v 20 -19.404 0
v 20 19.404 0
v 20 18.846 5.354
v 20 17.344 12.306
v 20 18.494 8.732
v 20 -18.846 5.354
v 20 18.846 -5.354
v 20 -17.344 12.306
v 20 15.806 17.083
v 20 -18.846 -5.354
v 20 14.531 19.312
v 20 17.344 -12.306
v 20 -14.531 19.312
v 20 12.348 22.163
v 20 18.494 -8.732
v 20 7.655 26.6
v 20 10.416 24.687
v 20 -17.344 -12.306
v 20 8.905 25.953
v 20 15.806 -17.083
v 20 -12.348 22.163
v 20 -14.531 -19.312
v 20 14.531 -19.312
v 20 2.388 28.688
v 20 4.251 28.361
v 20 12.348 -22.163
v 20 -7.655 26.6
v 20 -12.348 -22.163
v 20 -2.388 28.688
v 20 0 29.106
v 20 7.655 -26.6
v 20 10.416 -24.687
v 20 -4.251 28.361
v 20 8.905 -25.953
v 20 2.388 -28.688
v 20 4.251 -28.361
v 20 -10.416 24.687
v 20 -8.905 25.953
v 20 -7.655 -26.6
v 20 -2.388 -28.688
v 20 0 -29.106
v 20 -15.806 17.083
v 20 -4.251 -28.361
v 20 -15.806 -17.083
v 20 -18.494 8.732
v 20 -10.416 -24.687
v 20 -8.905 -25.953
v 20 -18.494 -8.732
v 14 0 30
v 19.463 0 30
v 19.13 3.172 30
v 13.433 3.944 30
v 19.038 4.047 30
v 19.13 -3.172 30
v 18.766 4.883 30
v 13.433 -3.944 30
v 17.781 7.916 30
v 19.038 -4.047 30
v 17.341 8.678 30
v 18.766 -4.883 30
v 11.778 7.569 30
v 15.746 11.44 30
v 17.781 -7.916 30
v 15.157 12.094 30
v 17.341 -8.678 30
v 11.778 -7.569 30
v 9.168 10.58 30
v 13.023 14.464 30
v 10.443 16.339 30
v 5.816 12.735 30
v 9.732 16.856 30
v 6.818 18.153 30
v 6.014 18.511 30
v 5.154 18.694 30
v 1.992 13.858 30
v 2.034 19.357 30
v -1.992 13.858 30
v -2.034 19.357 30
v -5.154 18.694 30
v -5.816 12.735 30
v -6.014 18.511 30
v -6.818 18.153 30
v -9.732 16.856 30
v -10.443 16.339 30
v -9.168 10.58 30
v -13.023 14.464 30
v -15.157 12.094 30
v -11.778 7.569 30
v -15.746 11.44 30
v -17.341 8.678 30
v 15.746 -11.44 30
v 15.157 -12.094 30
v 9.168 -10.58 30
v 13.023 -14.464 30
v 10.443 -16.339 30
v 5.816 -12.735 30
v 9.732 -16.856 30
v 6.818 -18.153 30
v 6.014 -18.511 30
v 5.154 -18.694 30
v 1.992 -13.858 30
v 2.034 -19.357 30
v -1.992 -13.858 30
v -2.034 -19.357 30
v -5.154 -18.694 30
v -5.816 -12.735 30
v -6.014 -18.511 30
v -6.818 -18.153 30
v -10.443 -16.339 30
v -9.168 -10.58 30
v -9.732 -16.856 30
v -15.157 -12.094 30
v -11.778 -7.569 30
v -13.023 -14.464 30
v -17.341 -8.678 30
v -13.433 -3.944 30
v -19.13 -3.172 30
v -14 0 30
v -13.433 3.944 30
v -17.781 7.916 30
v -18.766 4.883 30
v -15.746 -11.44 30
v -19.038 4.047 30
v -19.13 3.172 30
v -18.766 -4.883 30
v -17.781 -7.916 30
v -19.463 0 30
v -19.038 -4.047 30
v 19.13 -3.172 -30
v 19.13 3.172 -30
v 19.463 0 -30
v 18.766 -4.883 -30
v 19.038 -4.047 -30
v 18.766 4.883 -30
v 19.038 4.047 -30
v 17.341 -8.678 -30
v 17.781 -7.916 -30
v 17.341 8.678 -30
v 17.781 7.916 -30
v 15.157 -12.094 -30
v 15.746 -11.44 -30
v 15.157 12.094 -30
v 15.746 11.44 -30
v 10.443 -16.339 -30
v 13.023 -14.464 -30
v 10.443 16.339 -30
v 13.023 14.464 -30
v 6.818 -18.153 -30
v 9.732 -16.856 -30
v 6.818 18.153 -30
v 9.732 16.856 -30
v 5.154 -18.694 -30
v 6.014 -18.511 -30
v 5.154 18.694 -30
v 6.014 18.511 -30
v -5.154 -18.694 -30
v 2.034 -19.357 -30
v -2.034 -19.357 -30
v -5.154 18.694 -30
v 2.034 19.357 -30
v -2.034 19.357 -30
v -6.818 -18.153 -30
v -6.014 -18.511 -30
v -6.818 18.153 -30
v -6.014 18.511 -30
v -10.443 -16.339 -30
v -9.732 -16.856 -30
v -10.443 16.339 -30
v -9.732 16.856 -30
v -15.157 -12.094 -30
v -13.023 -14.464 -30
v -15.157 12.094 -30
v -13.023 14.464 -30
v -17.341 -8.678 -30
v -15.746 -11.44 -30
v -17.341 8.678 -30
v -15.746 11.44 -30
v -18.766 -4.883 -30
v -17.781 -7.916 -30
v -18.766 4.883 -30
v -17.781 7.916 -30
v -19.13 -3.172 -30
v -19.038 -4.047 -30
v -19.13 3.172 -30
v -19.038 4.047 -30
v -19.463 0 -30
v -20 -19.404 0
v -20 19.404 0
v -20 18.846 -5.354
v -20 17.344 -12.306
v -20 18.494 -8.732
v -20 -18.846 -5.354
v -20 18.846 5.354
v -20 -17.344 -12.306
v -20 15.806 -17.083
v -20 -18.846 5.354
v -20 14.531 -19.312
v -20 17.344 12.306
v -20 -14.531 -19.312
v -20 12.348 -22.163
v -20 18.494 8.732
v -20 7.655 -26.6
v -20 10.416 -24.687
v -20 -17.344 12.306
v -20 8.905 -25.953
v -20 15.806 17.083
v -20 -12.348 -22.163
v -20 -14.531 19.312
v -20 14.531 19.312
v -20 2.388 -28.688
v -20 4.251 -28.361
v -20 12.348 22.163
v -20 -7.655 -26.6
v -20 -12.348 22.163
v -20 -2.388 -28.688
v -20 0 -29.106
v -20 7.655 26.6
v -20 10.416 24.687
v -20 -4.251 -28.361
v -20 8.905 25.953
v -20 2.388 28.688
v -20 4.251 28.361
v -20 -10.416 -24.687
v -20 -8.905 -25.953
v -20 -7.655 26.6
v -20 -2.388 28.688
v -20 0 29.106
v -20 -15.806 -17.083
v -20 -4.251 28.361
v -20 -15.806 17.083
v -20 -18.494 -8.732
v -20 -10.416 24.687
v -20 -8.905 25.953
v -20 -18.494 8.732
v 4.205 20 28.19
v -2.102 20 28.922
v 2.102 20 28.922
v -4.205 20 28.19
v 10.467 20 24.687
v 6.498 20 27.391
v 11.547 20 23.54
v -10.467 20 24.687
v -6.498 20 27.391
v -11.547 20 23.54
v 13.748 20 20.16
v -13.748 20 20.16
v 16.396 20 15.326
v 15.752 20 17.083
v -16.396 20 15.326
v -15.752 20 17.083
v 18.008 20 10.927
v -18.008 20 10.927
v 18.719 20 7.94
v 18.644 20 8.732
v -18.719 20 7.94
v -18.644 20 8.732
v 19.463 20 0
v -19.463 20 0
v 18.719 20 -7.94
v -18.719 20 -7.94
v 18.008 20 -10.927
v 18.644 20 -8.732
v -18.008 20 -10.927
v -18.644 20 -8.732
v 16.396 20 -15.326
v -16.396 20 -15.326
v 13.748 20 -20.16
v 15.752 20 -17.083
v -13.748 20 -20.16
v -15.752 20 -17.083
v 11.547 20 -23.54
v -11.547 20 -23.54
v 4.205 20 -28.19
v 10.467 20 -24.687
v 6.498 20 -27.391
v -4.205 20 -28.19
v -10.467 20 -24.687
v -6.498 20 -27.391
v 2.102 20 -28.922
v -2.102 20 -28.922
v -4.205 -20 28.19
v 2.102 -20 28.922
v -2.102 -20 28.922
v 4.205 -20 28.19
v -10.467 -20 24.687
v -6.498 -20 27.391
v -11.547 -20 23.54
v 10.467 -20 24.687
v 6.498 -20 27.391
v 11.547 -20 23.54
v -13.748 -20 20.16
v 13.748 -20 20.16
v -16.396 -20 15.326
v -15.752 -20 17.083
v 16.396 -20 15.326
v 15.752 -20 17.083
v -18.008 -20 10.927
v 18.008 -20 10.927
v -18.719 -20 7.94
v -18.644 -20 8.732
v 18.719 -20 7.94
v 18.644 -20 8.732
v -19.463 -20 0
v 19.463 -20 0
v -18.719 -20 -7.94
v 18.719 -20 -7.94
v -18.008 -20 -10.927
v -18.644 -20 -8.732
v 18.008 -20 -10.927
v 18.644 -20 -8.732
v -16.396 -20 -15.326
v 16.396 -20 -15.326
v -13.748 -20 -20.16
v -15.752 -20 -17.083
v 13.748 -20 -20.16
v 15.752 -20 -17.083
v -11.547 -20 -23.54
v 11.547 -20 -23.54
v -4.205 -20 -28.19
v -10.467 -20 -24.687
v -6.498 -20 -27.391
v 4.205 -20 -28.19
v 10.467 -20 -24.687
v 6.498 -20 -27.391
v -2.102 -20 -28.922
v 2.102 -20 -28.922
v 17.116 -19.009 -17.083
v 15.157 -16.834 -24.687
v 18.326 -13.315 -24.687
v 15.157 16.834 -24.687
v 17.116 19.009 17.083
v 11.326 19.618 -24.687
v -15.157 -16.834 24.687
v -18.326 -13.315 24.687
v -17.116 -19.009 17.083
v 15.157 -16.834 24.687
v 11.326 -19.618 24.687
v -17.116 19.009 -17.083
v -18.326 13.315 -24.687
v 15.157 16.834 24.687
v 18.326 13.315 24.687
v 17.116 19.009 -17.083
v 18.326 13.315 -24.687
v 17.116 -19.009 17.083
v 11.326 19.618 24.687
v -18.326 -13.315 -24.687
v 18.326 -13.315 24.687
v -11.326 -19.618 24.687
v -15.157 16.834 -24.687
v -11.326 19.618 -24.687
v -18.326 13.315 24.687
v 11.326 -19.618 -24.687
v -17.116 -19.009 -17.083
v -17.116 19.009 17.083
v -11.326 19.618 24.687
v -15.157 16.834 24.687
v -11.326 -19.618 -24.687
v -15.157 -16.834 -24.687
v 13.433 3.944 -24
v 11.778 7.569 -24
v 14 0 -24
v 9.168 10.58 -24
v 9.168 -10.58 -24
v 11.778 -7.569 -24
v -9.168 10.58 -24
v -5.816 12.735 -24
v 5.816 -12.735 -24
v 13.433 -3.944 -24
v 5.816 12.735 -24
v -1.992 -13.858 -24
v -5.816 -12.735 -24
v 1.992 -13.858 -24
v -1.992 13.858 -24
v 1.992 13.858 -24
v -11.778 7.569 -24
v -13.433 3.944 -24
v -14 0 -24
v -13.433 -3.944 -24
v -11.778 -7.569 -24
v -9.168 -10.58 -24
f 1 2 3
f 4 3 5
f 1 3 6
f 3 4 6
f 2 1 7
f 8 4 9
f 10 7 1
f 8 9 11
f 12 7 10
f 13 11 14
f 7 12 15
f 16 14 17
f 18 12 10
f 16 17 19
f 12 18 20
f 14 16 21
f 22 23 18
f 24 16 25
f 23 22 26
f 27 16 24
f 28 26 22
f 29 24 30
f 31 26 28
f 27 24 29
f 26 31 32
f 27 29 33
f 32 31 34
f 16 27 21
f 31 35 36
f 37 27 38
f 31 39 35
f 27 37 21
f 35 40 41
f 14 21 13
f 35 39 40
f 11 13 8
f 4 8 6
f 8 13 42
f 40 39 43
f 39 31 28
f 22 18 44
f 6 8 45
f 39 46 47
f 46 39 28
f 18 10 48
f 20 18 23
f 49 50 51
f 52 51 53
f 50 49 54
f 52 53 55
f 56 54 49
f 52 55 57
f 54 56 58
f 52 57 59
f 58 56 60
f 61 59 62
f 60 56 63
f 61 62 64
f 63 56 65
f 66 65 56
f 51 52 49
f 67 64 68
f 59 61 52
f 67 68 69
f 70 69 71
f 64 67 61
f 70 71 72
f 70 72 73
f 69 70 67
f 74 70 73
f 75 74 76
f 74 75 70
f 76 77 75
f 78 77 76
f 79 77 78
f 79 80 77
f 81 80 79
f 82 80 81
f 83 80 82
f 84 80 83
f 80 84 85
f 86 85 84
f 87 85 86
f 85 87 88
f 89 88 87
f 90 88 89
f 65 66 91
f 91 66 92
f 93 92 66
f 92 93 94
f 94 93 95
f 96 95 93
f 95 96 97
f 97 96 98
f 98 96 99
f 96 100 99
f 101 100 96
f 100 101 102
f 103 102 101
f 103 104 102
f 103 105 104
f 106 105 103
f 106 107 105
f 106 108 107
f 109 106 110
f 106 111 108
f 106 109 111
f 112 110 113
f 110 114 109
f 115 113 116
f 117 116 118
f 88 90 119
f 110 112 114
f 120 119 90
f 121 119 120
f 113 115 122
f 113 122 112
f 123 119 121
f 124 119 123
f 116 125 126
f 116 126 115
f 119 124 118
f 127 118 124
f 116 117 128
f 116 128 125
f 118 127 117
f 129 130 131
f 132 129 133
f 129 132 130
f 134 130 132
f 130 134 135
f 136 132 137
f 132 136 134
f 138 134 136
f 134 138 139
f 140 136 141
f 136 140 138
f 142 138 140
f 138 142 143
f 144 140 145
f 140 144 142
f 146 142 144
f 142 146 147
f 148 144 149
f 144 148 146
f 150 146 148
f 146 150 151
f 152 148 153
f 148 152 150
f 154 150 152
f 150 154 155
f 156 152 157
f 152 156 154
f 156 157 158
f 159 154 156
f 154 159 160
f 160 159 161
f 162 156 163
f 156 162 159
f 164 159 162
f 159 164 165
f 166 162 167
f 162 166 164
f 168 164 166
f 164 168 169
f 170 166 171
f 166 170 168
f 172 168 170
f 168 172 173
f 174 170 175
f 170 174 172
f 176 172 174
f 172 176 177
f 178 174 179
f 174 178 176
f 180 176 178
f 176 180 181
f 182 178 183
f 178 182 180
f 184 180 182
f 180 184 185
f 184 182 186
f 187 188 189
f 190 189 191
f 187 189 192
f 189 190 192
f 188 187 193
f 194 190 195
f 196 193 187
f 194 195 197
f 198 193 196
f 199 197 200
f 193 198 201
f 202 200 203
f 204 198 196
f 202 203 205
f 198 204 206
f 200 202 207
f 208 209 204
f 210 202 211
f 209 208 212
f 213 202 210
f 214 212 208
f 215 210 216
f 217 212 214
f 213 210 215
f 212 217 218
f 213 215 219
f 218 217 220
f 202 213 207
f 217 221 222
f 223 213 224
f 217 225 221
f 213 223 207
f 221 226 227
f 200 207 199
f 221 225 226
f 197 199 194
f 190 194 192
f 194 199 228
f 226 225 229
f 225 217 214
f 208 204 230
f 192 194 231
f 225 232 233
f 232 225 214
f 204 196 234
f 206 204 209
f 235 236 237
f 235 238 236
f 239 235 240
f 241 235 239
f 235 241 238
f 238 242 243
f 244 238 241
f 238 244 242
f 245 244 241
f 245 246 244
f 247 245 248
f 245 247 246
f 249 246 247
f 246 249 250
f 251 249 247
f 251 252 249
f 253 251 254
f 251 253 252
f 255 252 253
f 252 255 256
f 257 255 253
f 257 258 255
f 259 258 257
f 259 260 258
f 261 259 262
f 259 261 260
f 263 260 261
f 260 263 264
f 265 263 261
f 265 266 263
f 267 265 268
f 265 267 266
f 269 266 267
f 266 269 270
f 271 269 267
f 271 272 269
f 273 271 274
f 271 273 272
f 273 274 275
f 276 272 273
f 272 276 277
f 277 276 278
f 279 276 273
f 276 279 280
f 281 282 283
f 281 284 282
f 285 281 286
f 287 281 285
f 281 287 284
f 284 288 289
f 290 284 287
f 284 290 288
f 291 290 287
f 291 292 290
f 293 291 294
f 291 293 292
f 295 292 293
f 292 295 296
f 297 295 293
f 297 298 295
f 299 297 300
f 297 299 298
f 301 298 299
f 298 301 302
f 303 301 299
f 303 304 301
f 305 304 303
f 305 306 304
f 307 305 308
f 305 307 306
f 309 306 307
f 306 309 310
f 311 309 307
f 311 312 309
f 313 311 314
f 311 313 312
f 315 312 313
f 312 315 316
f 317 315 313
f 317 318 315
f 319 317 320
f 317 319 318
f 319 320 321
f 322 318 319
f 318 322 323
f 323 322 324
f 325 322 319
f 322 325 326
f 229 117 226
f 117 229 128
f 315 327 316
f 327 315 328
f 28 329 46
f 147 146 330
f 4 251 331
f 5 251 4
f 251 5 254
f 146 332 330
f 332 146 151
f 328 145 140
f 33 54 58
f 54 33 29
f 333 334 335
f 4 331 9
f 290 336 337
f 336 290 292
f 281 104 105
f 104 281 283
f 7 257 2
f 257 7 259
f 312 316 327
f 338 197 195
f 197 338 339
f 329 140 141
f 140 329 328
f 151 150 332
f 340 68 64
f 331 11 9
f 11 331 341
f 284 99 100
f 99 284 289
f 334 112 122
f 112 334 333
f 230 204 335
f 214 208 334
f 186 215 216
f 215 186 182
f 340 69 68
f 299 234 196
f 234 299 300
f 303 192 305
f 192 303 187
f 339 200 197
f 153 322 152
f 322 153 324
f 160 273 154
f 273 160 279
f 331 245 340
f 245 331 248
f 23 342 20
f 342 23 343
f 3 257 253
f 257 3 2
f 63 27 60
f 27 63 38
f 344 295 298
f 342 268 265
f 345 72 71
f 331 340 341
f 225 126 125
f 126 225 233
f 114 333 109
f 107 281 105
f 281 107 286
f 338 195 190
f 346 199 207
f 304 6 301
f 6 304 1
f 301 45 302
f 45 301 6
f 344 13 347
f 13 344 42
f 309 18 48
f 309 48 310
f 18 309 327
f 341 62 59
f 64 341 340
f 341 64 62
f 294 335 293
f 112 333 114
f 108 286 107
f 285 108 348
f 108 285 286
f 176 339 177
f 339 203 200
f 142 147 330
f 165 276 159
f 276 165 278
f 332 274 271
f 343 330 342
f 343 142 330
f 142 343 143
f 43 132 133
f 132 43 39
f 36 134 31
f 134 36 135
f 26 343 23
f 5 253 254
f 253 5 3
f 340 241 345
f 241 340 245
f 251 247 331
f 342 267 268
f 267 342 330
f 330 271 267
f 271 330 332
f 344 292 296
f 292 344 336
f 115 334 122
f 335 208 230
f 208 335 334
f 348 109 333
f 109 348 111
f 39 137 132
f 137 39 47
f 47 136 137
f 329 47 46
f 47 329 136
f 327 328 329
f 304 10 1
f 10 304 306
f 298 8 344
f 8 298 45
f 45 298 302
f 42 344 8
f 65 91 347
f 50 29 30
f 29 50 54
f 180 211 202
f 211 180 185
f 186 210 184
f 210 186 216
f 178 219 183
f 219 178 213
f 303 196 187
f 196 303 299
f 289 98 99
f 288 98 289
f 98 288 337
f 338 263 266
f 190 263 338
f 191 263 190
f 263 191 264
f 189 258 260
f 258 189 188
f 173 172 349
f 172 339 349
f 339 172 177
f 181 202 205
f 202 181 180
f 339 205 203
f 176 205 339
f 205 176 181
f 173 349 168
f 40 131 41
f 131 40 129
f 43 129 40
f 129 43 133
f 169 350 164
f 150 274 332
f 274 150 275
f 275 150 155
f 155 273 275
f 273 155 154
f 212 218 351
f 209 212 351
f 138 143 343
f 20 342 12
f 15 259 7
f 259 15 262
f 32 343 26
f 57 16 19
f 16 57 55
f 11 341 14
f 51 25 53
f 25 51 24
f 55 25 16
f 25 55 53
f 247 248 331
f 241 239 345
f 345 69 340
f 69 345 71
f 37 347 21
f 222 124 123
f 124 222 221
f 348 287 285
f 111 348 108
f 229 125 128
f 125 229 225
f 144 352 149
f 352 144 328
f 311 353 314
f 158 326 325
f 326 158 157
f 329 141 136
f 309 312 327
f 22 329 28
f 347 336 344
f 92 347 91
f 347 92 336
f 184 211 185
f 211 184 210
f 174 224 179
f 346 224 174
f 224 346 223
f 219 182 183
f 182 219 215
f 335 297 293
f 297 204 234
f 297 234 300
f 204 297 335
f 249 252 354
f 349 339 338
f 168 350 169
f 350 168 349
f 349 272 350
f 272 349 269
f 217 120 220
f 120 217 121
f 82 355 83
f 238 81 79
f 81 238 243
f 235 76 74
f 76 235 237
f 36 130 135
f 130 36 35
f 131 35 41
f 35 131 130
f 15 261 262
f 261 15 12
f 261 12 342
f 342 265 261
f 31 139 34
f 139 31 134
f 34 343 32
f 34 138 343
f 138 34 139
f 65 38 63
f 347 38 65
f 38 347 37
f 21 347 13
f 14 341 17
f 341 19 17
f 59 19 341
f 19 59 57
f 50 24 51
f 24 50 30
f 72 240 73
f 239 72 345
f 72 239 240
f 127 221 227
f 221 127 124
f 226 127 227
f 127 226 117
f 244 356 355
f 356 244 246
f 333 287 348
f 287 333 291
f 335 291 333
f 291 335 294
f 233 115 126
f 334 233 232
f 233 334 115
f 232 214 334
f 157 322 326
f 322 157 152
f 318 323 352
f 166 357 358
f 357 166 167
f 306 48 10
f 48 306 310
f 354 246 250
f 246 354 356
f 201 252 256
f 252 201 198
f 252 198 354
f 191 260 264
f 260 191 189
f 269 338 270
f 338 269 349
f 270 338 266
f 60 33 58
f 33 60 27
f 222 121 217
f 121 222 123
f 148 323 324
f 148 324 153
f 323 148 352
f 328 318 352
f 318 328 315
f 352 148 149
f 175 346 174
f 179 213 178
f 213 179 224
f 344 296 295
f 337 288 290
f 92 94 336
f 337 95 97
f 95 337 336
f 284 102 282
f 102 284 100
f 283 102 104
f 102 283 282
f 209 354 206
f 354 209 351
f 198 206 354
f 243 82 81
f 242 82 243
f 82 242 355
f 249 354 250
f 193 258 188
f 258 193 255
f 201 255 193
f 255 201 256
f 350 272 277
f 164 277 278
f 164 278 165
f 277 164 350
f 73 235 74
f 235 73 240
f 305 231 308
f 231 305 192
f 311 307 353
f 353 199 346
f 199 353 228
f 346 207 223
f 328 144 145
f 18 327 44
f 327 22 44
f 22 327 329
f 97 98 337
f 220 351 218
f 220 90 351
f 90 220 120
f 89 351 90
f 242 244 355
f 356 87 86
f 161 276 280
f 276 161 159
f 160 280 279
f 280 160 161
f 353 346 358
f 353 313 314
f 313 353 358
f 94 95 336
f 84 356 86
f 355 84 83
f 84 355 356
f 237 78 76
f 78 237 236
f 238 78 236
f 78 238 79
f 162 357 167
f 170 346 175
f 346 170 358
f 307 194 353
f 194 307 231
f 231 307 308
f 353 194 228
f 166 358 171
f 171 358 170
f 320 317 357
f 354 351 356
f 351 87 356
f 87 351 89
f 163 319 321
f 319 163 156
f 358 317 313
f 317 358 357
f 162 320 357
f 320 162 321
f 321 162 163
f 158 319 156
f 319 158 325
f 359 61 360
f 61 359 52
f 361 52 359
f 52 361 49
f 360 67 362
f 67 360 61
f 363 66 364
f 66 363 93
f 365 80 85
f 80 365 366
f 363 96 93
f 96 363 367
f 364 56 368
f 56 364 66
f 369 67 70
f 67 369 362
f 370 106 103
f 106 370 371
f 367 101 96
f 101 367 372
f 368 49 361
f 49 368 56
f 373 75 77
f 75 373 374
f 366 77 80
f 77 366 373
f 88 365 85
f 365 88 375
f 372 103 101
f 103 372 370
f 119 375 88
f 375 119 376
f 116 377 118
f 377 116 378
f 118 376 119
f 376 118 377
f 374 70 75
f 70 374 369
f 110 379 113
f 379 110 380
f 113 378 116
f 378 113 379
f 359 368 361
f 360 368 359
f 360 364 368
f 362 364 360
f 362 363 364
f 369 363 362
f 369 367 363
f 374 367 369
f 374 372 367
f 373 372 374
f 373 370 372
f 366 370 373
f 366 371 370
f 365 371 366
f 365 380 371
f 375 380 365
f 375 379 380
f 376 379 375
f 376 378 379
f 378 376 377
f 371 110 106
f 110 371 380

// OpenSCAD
  scale([2,2,3])
  {
    difference()
    {
      intersection()
      {
        cube([20,20,20], center=true);
        sphere(14);
      }
      translate([0,0,-10+2])
        cylinder(r=7,h=20+2);
    }
  }
